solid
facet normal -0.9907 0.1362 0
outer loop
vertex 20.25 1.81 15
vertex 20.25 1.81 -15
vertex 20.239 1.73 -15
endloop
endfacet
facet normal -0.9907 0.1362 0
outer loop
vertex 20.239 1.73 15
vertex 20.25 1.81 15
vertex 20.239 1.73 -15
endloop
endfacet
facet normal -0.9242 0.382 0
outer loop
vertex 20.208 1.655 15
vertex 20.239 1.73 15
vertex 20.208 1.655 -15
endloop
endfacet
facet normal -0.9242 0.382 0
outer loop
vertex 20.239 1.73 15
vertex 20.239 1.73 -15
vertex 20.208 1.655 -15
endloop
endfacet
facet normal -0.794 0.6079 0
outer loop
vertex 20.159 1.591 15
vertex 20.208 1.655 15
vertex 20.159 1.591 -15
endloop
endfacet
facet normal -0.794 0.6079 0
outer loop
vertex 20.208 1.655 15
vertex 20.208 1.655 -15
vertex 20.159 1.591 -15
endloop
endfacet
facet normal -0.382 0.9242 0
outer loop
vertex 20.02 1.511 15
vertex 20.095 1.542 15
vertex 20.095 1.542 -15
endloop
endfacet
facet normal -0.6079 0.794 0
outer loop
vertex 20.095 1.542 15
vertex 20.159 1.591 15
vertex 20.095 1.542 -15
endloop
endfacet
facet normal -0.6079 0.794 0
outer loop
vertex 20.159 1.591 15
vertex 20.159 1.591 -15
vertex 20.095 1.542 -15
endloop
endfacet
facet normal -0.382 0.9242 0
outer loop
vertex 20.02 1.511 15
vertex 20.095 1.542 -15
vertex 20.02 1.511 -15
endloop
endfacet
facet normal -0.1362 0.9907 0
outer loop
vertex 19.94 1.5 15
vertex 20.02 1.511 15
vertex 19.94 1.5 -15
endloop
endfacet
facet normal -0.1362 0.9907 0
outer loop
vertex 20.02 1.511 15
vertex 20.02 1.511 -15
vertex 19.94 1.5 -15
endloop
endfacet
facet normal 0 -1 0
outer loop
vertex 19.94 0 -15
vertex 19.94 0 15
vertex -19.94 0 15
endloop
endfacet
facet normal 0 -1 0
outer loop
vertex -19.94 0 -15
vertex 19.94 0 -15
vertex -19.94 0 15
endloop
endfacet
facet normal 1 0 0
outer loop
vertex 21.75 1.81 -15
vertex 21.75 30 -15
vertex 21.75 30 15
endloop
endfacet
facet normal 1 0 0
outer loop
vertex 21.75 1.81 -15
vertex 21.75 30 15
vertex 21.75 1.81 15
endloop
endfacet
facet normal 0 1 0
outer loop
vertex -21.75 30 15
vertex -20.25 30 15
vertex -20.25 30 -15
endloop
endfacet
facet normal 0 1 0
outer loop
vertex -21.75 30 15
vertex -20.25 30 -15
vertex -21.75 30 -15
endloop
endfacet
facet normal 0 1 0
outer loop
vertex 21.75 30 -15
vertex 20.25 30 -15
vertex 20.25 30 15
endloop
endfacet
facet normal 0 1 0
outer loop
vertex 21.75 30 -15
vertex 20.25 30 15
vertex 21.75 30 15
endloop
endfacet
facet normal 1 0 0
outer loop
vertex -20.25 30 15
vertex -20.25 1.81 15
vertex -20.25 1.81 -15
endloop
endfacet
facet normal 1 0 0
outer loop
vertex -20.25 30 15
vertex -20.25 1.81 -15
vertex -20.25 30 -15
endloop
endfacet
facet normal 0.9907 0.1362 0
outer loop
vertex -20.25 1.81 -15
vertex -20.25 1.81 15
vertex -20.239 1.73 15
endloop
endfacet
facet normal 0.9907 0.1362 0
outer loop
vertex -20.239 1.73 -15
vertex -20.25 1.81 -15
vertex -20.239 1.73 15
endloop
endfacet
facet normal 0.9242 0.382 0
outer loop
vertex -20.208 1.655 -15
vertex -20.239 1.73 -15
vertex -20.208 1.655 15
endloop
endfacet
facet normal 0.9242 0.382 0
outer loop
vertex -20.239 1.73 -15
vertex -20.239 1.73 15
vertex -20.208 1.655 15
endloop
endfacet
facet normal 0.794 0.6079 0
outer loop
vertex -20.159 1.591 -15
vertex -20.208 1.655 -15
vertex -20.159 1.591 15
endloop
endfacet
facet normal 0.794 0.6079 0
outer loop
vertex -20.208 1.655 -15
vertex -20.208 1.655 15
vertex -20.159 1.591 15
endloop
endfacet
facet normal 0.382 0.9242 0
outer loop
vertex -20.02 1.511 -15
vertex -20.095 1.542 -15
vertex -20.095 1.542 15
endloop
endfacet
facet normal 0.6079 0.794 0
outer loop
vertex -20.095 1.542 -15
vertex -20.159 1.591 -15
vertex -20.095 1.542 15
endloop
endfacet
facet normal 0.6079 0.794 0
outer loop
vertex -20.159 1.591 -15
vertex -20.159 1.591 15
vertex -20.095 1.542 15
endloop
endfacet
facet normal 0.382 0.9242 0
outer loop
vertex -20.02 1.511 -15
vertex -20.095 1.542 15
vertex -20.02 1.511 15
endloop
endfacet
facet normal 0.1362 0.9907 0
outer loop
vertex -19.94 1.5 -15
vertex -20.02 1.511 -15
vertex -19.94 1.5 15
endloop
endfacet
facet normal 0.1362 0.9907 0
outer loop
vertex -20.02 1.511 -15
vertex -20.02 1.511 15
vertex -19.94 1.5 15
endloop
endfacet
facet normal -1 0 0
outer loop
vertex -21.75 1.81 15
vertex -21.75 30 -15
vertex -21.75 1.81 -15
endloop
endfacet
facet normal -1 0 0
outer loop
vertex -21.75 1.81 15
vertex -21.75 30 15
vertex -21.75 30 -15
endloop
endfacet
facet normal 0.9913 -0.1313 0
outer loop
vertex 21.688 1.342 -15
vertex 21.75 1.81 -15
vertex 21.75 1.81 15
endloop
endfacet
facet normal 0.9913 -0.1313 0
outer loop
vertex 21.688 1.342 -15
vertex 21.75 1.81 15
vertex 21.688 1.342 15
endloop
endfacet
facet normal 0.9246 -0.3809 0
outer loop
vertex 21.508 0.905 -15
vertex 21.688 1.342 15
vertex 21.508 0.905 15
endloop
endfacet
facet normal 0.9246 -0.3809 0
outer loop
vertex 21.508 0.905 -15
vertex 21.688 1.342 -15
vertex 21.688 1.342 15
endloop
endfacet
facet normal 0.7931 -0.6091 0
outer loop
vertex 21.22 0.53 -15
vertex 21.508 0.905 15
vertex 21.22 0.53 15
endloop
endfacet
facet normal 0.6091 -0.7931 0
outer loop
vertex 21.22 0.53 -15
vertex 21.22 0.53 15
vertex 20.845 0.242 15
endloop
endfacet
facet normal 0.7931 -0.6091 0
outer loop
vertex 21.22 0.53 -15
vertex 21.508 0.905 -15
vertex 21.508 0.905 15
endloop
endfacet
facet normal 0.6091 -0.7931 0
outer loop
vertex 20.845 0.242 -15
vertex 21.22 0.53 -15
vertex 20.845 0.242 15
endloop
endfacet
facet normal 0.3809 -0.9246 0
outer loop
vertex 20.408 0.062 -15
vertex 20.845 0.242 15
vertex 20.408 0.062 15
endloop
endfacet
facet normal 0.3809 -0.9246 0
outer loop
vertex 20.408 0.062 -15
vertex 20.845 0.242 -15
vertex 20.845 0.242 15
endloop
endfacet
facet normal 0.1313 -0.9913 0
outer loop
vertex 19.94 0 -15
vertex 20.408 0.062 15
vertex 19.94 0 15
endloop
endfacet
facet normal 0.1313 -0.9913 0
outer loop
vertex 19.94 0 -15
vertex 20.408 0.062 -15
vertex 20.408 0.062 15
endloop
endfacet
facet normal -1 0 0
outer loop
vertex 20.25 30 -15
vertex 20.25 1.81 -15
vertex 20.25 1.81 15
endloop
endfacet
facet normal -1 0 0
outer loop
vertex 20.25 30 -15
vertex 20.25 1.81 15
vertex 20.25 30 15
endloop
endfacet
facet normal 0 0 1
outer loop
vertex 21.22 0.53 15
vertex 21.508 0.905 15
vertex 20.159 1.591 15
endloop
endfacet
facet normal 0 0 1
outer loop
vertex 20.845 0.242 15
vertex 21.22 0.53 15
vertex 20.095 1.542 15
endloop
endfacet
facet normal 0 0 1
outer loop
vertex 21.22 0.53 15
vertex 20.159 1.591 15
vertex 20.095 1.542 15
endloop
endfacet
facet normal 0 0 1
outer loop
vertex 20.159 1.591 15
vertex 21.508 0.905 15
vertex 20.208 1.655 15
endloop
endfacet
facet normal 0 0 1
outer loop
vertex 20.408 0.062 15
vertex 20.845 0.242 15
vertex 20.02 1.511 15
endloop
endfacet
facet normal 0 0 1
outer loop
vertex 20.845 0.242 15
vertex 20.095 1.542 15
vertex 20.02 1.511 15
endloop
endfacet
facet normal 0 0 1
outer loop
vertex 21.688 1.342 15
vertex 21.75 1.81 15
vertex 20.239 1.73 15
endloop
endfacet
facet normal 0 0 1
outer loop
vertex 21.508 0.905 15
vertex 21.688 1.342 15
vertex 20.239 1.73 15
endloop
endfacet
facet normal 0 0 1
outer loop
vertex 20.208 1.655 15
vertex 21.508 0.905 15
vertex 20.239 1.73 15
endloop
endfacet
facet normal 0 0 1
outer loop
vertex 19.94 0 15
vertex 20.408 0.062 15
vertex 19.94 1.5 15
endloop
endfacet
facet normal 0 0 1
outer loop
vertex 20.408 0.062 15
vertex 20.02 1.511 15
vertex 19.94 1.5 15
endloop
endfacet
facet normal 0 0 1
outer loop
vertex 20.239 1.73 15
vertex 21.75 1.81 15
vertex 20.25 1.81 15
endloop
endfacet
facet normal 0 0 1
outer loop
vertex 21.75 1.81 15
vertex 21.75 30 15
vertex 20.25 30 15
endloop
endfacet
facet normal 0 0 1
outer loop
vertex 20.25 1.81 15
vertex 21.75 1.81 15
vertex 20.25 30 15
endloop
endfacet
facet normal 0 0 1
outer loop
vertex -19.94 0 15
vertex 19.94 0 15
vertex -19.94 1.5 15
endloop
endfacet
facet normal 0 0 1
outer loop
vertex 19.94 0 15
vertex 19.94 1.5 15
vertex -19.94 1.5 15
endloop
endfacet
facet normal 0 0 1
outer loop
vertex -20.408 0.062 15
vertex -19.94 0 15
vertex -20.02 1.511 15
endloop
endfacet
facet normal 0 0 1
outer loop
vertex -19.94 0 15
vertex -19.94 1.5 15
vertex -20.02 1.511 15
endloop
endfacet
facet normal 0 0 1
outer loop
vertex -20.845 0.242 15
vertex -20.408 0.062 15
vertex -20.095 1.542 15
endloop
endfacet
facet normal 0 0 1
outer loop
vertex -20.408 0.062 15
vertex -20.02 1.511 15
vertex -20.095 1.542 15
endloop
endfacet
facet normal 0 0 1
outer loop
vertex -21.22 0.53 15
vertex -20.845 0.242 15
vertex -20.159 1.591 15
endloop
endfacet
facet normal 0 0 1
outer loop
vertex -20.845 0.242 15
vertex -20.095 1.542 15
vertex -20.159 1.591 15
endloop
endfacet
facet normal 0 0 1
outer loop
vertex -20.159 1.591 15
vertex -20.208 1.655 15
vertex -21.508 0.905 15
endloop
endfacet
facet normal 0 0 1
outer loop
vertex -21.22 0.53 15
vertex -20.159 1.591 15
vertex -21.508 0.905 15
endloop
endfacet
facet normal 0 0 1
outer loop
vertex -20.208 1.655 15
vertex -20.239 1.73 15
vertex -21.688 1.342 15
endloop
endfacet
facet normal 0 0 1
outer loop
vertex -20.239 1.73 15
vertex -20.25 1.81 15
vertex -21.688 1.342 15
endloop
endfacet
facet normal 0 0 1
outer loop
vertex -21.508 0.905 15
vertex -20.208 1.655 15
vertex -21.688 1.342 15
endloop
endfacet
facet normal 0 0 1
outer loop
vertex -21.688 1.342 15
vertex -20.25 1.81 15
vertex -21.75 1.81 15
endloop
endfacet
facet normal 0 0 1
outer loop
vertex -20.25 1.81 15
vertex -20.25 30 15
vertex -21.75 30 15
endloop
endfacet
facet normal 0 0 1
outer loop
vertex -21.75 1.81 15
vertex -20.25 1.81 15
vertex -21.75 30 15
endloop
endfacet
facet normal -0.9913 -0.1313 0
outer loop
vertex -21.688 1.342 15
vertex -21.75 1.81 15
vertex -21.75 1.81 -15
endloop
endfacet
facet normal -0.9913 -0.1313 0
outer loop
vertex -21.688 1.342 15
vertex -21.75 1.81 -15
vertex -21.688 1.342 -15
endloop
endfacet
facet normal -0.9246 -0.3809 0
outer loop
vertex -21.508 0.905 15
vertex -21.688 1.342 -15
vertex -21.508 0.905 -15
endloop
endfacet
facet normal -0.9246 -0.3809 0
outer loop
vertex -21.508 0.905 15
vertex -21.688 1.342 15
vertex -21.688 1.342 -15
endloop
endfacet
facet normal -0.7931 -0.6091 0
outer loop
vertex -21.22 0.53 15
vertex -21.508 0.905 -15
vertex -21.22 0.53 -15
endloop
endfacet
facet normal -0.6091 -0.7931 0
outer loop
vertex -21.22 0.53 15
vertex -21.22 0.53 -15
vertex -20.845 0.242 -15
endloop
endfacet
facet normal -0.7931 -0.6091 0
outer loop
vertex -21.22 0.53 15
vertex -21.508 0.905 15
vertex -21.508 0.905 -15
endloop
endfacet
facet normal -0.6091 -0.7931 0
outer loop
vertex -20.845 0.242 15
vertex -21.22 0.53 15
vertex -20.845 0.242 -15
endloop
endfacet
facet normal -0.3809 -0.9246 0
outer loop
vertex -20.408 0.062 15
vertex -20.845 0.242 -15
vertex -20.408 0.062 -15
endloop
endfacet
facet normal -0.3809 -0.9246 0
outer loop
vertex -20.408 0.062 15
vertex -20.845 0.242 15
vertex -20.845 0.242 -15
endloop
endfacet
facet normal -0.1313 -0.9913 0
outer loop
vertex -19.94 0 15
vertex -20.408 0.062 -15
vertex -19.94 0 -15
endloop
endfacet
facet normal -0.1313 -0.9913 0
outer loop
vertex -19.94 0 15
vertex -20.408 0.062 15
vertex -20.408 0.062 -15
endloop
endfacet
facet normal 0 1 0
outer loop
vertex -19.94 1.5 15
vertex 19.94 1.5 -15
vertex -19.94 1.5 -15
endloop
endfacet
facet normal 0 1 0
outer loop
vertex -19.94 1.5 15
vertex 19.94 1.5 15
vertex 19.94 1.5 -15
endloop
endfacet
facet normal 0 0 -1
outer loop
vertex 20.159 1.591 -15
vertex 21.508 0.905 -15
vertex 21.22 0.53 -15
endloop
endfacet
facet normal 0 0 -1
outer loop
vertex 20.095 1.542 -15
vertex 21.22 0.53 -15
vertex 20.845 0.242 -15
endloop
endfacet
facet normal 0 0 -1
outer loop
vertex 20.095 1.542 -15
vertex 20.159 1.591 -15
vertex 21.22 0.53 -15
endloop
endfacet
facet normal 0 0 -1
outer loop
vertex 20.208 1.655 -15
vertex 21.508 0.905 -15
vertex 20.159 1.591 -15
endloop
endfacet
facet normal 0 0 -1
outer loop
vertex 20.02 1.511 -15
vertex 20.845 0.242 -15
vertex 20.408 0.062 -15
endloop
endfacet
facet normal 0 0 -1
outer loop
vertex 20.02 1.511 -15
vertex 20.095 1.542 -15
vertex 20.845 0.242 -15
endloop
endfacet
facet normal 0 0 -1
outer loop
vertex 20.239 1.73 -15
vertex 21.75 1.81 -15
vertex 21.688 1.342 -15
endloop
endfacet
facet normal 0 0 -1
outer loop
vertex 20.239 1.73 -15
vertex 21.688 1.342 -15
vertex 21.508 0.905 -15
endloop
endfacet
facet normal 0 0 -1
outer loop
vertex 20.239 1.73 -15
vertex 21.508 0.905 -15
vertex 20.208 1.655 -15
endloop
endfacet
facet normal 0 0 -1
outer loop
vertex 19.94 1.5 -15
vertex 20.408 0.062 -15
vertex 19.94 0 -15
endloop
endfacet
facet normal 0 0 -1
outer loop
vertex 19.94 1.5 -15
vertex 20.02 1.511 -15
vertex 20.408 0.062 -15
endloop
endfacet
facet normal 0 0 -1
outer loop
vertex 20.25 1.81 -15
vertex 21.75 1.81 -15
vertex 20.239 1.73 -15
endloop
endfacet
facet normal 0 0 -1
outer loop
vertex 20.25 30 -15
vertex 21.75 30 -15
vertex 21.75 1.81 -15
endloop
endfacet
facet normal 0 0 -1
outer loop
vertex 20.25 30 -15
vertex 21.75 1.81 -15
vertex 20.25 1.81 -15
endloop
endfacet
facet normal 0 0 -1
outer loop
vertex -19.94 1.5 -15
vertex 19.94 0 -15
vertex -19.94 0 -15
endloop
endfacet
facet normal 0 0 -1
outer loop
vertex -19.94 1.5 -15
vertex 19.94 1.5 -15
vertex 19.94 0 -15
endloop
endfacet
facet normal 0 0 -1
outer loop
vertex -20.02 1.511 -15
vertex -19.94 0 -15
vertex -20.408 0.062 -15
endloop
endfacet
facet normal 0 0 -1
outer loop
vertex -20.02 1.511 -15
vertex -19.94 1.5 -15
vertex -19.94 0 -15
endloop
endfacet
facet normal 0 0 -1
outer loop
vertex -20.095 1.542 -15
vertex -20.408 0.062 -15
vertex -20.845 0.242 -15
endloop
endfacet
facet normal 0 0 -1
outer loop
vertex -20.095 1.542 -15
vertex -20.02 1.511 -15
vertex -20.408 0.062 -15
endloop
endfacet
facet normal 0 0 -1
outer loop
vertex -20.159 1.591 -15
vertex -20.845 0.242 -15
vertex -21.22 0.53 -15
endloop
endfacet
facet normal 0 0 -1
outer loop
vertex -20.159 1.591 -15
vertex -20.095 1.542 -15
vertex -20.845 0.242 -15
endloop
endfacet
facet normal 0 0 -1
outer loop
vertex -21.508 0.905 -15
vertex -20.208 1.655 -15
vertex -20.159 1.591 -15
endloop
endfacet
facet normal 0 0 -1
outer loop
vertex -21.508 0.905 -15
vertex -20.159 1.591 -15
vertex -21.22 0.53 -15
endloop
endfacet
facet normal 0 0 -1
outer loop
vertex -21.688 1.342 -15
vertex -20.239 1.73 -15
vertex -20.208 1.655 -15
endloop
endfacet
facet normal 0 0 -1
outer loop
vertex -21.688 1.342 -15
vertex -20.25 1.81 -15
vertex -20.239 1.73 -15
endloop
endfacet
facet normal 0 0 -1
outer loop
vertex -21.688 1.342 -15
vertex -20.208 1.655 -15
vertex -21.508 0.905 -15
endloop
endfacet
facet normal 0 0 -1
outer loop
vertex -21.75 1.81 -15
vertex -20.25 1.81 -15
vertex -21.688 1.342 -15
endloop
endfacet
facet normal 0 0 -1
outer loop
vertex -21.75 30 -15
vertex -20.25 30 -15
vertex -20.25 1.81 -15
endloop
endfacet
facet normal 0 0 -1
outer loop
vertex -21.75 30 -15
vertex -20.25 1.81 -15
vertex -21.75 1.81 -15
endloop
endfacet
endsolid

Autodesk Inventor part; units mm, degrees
ref_plane "YZ Plane" through (0, 0, 0) normal (1, 0, 0) x (0, 1, 0)
ref_plane "XZ Plane" through (0, 0, 0) normal (0, 1, 0) x (-1, 0, 0)
ref_plane "XY Plane" through (0, 0, 0) normal (0, 0, 1) x (1, 0, 0)
sketch "Sketch1" plane through (0, 0, 0) normal (0, 1, 0) x (-1, 0, 0)
  line L0 (-20.25, 15) -> (20.25, 15)
  line L1 (20.25, 15) -> (20.25, -15)
  line L2 (20.25, -15) -> (-20.25, -15)
  line L3 (-20.25, -15) -> (-20.25, 15)
  line L4 (-20.25, 15) -> (20.25, -15) construction
  line L5 (20.25, 15) -> (-20.25, -15) construction
  point P0 (0, 0)
  dimension "d0" = 30
  dimension "d1" = 40.5
extrude "Plate1" add sketch "Sketch1" along normal blind 1.5
sketch "Sketch2" plane through (21.75, 0, -15) normal (-1, 0, 0) x (0, -1, 0)
  line L0 (0, 30) -> (0, 0)
  line L1 (0, 0) -> (-30, 0)
  line L2 (-30, 0) -> (-30, 30)
  line L3 (-30, 30) -> (0, 30)
edge flange "Flange1" height 30 angle 90 thickness 1.5 bend radius 0.31 thickness toward (-1, 0, 0) relief tear relief width 1.5 relief depth 0.75 corner gap 0.31 corner form 0 edges at (20.25, 1.5, 0) (-20.25, 1.5, 0) wall of the first edge with corners at (21.75, 0, 15) (21.75, 0, -15) (21.75, 30, -15) (21.75, 30, 15)
bend "Bend1"
corner "Corner1"
sketch "Sketch3" plane through (-21.75, 30, -15) normal (-1, 0, 0) x (0, 0, 1)
  point P0 (15, -30)
equation "\"d2\" = Thickness"
equation "\"d3\" = BendReliefWidth"
equation "\"d4\" = BendReliefDepth"
equation "\"d5\" = MinimumRemnant"
equation "\"d6\" = TransitionRadius"
equation "\"d9\" = BendRadius"
equation "\"d10\" = CornerReliefSize"
equation "\"d11\" = GapSize"
equation "\"d12\" = JacobiRadiusSize"
equation "\"BendReliefWidth\" = Thickness"
equation "\"BendReliefDepth\" = 0.5 * Thickness"
equation "\"CornerReliefSize\" = 4 * Thickness"
equation "\"MinimumRemnant\" = 2 * Thickness"
equation "\"TransitionRadius\" = BendRadius"
equation "\"JacobiRadiusSize\" = BendRadius"
equation "\"GapSize\" = Thickness"
equation "\"Thickness\" = 1.5"
equation "\"BendRadius\" = 0.31"
properties part number "hurseong" material "Aluminum 6061-AHC"
